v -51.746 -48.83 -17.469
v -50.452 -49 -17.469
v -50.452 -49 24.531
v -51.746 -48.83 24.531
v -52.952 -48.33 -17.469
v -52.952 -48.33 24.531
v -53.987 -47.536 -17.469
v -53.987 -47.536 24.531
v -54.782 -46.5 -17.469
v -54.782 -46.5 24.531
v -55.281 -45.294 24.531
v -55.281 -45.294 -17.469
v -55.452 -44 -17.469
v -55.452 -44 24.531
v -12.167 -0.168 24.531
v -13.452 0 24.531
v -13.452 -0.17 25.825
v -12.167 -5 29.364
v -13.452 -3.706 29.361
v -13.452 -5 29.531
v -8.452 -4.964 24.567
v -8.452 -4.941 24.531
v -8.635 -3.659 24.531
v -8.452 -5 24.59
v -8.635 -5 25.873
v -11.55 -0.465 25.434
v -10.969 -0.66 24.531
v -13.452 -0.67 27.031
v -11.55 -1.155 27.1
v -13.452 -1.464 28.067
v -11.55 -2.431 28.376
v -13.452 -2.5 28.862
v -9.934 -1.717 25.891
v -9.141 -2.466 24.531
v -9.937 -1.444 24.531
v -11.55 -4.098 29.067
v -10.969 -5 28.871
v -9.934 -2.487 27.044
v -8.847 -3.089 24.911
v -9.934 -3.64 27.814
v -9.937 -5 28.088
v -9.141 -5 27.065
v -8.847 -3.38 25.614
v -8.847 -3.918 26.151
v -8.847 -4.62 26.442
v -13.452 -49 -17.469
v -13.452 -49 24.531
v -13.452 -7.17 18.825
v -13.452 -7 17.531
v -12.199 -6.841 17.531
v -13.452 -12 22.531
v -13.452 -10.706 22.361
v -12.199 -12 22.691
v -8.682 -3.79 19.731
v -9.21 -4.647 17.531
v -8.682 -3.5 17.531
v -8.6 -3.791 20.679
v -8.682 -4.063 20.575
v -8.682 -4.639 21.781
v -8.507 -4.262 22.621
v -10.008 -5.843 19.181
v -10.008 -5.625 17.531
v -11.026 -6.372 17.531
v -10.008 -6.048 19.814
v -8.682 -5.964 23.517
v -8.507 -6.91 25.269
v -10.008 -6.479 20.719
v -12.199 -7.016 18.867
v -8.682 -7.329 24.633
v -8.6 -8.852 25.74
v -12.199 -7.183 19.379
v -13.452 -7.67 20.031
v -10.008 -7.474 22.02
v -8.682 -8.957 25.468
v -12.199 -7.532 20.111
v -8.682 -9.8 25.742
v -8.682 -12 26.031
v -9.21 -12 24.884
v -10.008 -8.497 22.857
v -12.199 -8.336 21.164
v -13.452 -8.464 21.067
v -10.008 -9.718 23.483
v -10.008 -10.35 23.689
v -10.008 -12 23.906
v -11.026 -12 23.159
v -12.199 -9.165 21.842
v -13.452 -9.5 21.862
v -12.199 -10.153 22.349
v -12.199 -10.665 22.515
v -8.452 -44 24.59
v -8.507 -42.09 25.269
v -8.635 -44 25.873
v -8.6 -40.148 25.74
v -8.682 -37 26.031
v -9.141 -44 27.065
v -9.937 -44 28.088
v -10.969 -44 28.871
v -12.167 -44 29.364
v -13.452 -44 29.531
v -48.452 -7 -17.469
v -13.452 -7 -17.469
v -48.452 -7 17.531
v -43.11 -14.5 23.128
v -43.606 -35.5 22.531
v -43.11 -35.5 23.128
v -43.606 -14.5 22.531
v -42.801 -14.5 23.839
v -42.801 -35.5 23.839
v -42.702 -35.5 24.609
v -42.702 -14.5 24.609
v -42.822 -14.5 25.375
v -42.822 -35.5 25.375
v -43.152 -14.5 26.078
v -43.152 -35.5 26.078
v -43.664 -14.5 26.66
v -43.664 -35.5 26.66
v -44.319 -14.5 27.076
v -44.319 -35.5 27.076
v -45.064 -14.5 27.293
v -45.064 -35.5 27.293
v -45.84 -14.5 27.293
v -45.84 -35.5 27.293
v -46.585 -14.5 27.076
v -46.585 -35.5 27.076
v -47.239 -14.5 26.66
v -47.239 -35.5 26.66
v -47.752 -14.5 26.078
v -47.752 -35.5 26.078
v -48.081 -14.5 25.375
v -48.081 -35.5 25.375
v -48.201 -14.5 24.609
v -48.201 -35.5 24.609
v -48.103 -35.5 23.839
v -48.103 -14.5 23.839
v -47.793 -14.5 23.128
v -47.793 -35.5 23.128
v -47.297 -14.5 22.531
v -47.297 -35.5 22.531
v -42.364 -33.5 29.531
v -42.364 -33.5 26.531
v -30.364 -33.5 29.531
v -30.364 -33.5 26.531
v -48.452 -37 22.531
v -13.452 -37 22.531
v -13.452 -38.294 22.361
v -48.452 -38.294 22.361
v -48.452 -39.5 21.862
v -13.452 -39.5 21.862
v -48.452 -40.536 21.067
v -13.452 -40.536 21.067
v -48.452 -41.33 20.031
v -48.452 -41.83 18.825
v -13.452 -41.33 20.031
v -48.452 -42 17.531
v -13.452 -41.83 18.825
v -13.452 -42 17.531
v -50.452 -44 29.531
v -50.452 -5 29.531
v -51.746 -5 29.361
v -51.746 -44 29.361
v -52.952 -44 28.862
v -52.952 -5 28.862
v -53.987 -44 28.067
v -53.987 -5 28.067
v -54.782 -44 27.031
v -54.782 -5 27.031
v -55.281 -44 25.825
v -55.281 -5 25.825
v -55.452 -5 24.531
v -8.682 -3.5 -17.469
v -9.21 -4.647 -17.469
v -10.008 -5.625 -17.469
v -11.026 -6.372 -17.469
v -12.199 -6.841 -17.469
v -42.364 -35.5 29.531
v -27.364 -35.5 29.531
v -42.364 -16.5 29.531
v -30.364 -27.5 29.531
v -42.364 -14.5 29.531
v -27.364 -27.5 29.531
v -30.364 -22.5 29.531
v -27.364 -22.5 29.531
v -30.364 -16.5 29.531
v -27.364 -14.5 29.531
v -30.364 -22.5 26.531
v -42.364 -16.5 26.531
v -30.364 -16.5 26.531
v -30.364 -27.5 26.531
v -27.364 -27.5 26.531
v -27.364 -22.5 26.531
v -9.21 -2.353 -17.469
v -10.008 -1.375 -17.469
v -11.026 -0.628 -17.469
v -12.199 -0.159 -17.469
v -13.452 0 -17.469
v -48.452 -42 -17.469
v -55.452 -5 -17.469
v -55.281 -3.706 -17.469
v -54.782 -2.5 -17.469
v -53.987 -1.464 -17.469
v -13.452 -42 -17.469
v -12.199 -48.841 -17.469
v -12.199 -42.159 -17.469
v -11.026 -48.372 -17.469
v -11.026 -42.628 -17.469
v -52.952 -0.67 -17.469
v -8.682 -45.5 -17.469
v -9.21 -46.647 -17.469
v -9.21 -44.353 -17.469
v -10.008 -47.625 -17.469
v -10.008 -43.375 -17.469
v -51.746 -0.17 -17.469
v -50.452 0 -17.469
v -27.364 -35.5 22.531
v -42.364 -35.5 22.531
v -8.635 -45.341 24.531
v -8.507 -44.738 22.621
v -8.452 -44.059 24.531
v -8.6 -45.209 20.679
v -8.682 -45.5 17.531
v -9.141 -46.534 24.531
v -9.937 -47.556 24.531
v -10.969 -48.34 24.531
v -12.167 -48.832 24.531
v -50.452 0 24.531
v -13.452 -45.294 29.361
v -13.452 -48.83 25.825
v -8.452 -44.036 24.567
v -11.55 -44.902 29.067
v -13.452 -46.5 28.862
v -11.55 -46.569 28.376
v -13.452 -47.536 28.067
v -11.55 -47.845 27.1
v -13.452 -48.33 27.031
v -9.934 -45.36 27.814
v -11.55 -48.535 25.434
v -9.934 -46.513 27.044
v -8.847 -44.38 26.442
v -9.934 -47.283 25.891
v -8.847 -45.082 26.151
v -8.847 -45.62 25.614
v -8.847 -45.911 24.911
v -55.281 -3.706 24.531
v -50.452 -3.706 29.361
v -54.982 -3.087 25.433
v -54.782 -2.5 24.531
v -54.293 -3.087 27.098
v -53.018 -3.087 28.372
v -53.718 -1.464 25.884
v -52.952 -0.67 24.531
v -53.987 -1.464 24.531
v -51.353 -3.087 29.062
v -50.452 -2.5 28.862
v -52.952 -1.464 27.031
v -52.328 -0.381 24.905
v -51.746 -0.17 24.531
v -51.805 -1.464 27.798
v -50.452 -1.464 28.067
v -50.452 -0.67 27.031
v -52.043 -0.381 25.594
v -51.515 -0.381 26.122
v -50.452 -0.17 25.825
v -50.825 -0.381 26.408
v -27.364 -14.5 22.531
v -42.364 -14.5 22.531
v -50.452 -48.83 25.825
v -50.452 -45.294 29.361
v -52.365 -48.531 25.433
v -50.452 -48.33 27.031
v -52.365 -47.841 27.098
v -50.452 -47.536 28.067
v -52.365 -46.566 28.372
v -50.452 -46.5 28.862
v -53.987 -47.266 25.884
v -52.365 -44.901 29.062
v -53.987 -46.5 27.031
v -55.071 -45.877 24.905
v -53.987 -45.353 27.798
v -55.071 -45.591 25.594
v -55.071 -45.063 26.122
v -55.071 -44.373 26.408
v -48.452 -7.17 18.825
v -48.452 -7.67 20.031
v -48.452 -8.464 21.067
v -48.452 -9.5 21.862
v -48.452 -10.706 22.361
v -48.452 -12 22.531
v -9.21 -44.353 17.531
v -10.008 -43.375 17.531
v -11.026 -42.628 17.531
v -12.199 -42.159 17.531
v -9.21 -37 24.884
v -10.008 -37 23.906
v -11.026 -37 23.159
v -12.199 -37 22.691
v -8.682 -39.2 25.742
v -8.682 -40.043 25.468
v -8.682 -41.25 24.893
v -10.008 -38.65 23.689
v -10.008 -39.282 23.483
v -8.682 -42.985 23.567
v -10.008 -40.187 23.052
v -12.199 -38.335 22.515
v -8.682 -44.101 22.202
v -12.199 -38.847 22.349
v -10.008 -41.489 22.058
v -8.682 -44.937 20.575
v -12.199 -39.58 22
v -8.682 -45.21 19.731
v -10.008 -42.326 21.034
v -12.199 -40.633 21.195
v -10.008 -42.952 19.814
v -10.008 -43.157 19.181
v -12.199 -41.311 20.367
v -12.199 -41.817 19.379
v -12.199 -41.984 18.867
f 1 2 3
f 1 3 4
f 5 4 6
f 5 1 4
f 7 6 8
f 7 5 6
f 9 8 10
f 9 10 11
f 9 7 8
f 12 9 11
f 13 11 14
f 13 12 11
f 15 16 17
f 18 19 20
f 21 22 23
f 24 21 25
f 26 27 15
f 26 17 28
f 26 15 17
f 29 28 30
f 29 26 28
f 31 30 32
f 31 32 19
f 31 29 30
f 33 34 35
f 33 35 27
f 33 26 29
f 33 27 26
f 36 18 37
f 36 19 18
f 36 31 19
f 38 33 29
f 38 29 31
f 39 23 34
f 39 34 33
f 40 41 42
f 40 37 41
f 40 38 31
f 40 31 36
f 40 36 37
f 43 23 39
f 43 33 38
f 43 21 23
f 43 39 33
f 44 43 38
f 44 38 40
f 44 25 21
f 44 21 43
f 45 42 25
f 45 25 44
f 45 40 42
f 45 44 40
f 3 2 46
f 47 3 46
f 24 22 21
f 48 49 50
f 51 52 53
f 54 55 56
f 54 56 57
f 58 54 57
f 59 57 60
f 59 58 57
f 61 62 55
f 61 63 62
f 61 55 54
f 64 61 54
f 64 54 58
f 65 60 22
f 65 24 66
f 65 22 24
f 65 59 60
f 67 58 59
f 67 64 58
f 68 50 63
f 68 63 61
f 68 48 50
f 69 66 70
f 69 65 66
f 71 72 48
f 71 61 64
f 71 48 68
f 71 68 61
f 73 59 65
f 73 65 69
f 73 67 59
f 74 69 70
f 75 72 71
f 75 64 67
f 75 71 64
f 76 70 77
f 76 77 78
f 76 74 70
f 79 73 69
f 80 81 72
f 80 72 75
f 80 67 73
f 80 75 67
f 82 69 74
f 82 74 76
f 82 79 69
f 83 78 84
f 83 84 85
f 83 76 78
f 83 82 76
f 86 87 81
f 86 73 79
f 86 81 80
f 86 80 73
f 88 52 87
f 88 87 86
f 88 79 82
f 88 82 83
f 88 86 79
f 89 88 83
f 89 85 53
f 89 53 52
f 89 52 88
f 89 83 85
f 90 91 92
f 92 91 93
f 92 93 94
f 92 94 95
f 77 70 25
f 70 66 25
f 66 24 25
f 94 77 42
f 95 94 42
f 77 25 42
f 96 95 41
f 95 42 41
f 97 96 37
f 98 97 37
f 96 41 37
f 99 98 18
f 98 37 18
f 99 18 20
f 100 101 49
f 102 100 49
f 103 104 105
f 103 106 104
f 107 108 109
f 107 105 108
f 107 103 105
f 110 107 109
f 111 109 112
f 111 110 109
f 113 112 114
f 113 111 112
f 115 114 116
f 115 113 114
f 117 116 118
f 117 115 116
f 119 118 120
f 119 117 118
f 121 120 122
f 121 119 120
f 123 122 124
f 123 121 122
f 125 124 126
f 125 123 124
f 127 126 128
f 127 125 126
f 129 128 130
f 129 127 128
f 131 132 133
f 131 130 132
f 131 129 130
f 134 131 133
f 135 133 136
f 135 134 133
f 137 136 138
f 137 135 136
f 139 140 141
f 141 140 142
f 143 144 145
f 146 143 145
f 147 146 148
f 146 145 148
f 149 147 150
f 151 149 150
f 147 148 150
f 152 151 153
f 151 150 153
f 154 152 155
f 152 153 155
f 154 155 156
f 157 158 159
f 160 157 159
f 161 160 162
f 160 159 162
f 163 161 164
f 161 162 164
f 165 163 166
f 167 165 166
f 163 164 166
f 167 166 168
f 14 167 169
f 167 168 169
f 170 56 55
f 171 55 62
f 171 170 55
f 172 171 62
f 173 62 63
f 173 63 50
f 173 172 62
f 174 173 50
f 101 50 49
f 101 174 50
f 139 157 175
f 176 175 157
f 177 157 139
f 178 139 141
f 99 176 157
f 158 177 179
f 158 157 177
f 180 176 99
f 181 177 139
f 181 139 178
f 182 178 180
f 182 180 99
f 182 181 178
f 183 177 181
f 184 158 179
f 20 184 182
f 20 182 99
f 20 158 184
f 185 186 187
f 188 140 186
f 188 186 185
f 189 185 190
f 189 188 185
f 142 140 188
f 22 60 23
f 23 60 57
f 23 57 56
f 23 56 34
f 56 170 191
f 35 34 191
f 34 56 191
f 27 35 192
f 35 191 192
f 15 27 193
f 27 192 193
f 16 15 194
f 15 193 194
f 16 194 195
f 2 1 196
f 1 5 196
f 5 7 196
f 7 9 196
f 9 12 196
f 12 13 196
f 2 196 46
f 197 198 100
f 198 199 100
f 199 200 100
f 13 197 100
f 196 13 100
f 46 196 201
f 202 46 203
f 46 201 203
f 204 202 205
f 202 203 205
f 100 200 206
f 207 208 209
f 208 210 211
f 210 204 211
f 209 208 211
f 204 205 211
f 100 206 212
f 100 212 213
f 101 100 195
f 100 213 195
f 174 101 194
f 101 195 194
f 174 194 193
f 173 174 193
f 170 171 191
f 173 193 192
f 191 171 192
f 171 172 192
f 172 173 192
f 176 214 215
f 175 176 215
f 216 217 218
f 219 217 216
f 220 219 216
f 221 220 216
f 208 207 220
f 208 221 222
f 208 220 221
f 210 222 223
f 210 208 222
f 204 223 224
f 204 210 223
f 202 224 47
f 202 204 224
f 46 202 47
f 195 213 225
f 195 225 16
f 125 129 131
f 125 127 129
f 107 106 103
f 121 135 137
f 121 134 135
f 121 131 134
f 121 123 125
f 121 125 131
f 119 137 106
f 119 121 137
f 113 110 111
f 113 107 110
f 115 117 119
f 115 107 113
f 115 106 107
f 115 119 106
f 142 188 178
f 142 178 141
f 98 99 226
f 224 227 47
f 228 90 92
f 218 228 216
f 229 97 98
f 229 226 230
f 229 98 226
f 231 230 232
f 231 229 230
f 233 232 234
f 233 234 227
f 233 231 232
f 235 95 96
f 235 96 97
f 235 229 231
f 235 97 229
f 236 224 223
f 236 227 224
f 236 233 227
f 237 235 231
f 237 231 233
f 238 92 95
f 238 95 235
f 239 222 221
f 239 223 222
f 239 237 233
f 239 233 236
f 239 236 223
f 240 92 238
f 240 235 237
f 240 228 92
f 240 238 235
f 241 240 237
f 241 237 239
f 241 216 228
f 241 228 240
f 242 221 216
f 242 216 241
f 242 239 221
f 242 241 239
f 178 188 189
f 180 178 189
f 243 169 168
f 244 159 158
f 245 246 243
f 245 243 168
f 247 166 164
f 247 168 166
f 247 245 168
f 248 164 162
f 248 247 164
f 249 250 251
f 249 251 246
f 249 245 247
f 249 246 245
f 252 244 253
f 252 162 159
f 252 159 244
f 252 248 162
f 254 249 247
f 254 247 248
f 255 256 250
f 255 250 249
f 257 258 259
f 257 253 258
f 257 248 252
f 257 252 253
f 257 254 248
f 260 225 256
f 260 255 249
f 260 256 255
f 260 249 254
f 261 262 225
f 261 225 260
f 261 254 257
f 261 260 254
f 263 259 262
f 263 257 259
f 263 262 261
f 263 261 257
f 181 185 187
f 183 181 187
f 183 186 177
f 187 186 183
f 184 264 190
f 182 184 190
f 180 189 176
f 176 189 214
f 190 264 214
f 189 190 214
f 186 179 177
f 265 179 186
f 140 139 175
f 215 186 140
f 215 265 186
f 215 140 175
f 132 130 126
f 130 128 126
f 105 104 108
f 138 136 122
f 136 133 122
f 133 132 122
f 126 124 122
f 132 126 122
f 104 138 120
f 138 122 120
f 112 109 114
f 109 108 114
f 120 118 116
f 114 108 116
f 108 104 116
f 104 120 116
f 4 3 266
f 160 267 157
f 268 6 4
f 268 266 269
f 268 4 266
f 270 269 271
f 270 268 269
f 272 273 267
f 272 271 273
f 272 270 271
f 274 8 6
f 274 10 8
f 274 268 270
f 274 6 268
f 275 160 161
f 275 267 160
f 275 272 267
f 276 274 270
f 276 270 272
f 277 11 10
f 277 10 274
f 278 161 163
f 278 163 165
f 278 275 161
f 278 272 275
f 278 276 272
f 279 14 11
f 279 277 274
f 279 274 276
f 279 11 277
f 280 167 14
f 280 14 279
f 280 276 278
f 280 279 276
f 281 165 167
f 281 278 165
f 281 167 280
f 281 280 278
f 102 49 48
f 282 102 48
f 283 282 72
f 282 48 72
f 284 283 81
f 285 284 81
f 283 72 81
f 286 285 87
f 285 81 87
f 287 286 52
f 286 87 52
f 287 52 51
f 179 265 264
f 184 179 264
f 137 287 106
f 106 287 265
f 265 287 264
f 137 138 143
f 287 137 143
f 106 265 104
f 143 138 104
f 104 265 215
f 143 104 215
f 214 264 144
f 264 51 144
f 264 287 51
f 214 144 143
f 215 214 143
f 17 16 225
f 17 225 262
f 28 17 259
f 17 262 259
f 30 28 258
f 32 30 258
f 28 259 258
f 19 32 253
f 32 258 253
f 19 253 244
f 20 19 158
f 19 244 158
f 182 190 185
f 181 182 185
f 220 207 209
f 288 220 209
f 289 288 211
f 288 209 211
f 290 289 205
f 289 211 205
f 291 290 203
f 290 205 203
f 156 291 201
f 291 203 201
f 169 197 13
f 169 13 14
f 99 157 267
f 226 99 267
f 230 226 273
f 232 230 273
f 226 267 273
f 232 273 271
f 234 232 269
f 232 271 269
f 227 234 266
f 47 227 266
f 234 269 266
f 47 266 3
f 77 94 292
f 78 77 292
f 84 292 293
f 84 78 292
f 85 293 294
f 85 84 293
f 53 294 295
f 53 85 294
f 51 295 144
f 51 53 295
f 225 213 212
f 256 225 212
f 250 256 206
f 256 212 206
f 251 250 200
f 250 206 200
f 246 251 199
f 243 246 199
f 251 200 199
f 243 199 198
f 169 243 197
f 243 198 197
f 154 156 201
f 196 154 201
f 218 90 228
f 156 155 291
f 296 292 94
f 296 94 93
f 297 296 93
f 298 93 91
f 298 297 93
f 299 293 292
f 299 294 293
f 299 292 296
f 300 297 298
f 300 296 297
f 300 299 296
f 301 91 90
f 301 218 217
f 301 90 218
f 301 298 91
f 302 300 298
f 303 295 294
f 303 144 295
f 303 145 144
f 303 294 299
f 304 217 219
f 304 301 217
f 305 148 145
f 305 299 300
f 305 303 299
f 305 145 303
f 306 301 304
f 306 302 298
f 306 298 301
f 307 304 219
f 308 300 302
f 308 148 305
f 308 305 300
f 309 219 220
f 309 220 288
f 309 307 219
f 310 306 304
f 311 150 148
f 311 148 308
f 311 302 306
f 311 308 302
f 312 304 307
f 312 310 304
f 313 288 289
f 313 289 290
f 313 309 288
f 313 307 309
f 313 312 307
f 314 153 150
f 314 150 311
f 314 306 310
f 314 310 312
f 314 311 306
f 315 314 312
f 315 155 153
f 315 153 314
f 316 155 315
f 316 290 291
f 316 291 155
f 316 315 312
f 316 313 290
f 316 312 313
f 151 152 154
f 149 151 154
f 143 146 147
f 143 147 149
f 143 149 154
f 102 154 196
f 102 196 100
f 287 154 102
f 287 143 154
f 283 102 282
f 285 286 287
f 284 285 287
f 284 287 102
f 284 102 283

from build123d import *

# Parameters (mm, degrees)
F0_W         = 47
F0_H         = 47
F1_DEPTH     = 49
F3_DEPTH     = 40
F4_T1_DEPTH  = 37
F4_T3_DEPTH  = 54.5
F4_T5_DEPTH  = 39
F4_T7_DEPTH  = 25
F4_T9_DEPTH  = 47.5
F4_S13_W     = 5
F4_S13_H     = 5
F4_T14_DEPTH = 5
F4_S19_W     = 5
F4_S19_H     = 5
F4_T20_DEPTH = 5
F4_S25_W     = 5
F4_S25_H     = 5
F4_T26_DEPTH = 5
F4_S31_W     = 5
F4_S31_H     = 5
F4_T32_DEPTH = 5
F4_T36_ANGLE = 90
F4_T38_ANGLE = 90
F6_R         = 2.75
F7_DEPTH     = 21
F8_W         = 15
F8_H         = 21
F9_DEPTH     = 4
F10_W        = 3
F10_H        = 6
F10_W_2      = 12
F10_H_2      = 2
F11_DEPTH    = 3.0010001


# Not quite as in the source:
# - a fillet or chamfer that OpenCascade refuses, or shapes differently, is made with other operations: its cross-section is extruded or revolved along the edge and cut away or added


with BuildPart() as f1:
    # F0 (on Front) → F1 (new body)
    with BuildSketch(Plane.XZ):
        with Locations((-31.9517639409, 6.0313746929)):
            Rectangle(F0_W, F0_H)
    extrude(amount=F1_DEPTH)

    # F2 (on face) → F3 (cut)
    with BuildSketch(Plane.YZ.offset(-8.4517639409)):
        with BuildLine():
            Line((-12, 22.5313746929), (-37, 22.5313746929))
            ThreePointArc((-37, 22.5313746929), (-40.5355339059, 21.0669085988), (-42, 17.5313746929))
            Line((-42, 17.5313746929), (-42, -17.4686253071))
            Line((-42, -17.4686253071), (-7, -17.4686253071))
            Line((-7, -17.4686253071), (-7, 17.5313746929))
            ThreePointArc((-7, 17.5313746929), (-8.4644660941, 21.0669085988), (-12, 22.5313746929))
        make_face()
    extrude(amount=-F3_DEPTH, mode=Mode.SUBTRACT)

    # F4: fillet of radius 5 on 9 edges, made by hand

    # F4_s2 → F4_t1 (cut)
    with BuildSketch(Plane.YZ.offset(-50.4517639409)):
        with BuildLine():
            ThreePointArc((-44, 29.5313746929), (-47.5355339059, 28.0669085988), (-49, 24.5313746929))
            Line((-49, 24.5313746929), (-49, 29.5313746929))
            Line((-49, 29.5313746929), (-44, 29.5313746929))
        make_face()
        with BuildLine():
            ThreePointArc((0, 24.5313746929), (-1.4644660941, 28.0669085988), (-5, 29.5313746929))
            Line((-5, 29.5313746929), (0, 29.5313746929))
            Line((0, 29.5313746929), (0, 24.5313746929))
        make_face()
    extrude(amount=F4_T1_DEPTH, mode=Mode.SUBTRACT)

    # F4_s4 → F4_t3 (cut)
    with BuildSketch(Plane.XY.offset(-29.9686253071)):
        with BuildLine():
            ThreePointArc((-8.4517639409, -44), (-9.9162300349, -47.5355339059), (-13.4517639409, -49))
            Line((-13.4517639409, -49), (-8.4517639409, -49))
            Line((-8.4517639409, -49), (-8.4517639409, -44))
        make_face()
        with BuildLine():
            ThreePointArc((-8.4517639409, -5), (-9.9162300349, -1.4644660941), (-13.4517639409, 0))
            Line((-13.4517639409, 0), (-8.4517639409, 0))
            Line((-8.4517639409, 0), (-8.4517639409, -5))
        make_face()
        with BuildLine():
            ThreePointArc((-50.4517639409, 0), (-53.9872978468, -1.4644660941), (-55.4517639409, -5))
            Line((-55.4517639409, -5), (-55.4517639409, 0))
            Line((-55.4517639409, 0), (-50.4517639409, 0))
        make_face()
        with BuildLine():
            ThreePointArc((-50.4517639409, -49), (-53.9872978468, -47.5355339059), (-55.4517639409, -44))
            Line((-55.4517639409, -44), (-55.4517639409, -49))
            Line((-55.4517639409, -49), (-50.4517639409, -49))
        make_face()
    extrude(amount=F4_T3_DEPTH, mode=Mode.SUBTRACT)

    # F4_s6 → F4_t5 (cut)
    with BuildSketch(Plane.XZ.offset(5)):
        with BuildLine():
            ThreePointArc((-8.4517639409, 24.5313746929), (-9.9162300349, 28.0669085988), (-13.4517639409, 29.5313746929))
            Line((-13.4517639409, 29.5313746929), (-8.4517639409, 29.5313746929))
            Line((-8.4517639409, 29.5313746929), (-8.4517639409, 24.5313746929))
        make_face()
        with BuildLine():
            ThreePointArc((-50.4517639409, 29.5313746929), (-53.9872978468, 28.0669085988), (-55.4517639409, 24.5313746929))
            Line((-55.4517639409, 24.5313746929), (-55.4517639409, 29.5313746929))
            Line((-55.4517639409, 29.5313746929), (-50.4517639409, 29.5313746929))
        make_face()
    extrude(amount=F4_T5_DEPTH, mode=Mode.SUBTRACT)

    # F4_s8 → F4_t7 (cut)
    with BuildSketch(Plane.XZ.offset(12)):
        with BuildLine():
            ThreePointArc((-8.4517639409, 27.5313746929), (-9.9162300349, 23.995840787), (-13.4517639409, 22.5313746929))
            Line((-13.4517639409, 22.5313746929), (-8.4517639409, 22.5313746929))
            Line((-8.4517639409, 22.5313746929), (-8.4517639409, 27.5313746929))
        make_face()
    extrude(amount=F4_T7_DEPTH, mode=Mode.SUBTRACT)

    # F4_s10 → F4_t9 (cut)
    with BuildSketch(Plane.XY.offset(-29.9686253071)):
        with BuildLine():
            ThreePointArc((-8.4517639409, -47), (-9.9162300349, -43.4644660941), (-13.4517639409, -42))
            Line((-13.4517639409, -42), (-8.4517639409, -42))
            Line((-8.4517639409, -42), (-8.4517639409, -47))
        make_face()
        with BuildLine():
            ThreePointArc((-8.4517639409, -2), (-9.9162300349, -5.5355339059), (-13.4517639409, -7))
            Line((-13.4517639409, -7), (-8.4517639409, -7))
            Line((-8.4517639409, -7), (-8.4517639409, -2))
        make_face()
    extrude(amount=F4_T9_DEPTH, mode=Mode.SUBTRACT)


with BuildPart() as f4_tool12:
    # F4_s13 → F4_t14 (new body)
    with BuildSketch(Plane.YZ.offset(-13.4517639409)):
        with Locations((-46.5, 27.0313746929)):
            Rectangle(F4_S13_W, F4_S13_H)
    extrude(amount=F4_T14_DEPTH)

    # F4_s15 → F4_t16 (revolve, cut)
    with BuildSketch(Plane(origin=(-13.4517639409, -44, 24.5313746929), x_dir=(0, 0.7071067812, -0.7071067812), z_dir=(0, -0.7071067812, -0.7071067812))):
        with BuildLine():
            ThreePointArc((0, -5), (5, 0), (0, 5))
            Line((0, 5), (0, -5))
        make_face()
    revolve(axis=Axis((-13.4517639409, -44, 24.5313746929), (1, 0, 0)), mode=Mode.SUBTRACT)


with BuildPart() as f1_1:
    add(f1.part)

    # F4_t11: cut F4_tool12
    add(f4_tool12.part, mode=Mode.SUBTRACT)


with BuildPart() as f4_tool18:
    # F4_s19 → F4_t20 (new body)
    with BuildSketch(Plane.YZ.offset(-50.4517639409)):
        with Locations((-46.5, 27.0313746929)):
            Rectangle(F4_S19_W, F4_S19_H)
    extrude(amount=-F4_T20_DEPTH)

    # F4_s21 → F4_t22 (revolve, cut)
    with BuildSketch(Plane(origin=(-50.4517639409, -44, 24.5313746929), x_dir=(0, 0.7071067812, -0.7071067812), z_dir=(0, 0.7071067812, 0.7071067812))):
        with BuildLine():
            ThreePointArc((0, -5), (5, 0), (0, 5))
            Line((0, 5), (0, -5))
        make_face()
    revolve(axis=Axis((-50.4517639409, -44, 24.5313746929), (-1, 0, 0)), mode=Mode.SUBTRACT)


with BuildPart() as f1_2:
    add(f1_1.part)

    # F4_t17: cut F4_tool18
    add(f4_tool18.part, mode=Mode.SUBTRACT)


with BuildPart() as f4_tool24:
    # F4_s25 → F4_t26 (new body)
    with BuildSketch(Plane.YZ.offset(-13.4517639409)):
        with Locations((-2.5, 27.0313746929)):
            Rectangle(F4_S25_W, F4_S25_H)
    extrude(amount=F4_T26_DEPTH)

    # F4_s27 → F4_t28 (revolve, cut)
    with BuildSketch(Plane(origin=(-13.4517639409, -5, 24.5313746929), x_dir=(0, -0.7071067812, -0.7071067812), z_dir=(0, -0.7071067812, 0.7071067812))):
        with BuildLine():
            ThreePointArc((0, -5), (5, 0), (0, 5))
            Line((0, 5), (0, -5))
        make_face()
    revolve(axis=Axis((-13.4517639409, -5, 24.5313746929), (1, 0, 0)), mode=Mode.SUBTRACT)


with BuildPart() as f1_3:
    add(f1_2.part)

    # F4_t23: cut F4_tool24
    add(f4_tool24.part, mode=Mode.SUBTRACT)


with BuildPart() as f4_tool30:
    # F4_s31 → F4_t32 (new body)
    with BuildSketch(Plane.XZ.offset(5)):
        with Locations((-52.9517639409, 27.0313746929)):
            Rectangle(F4_S31_W, F4_S31_H)
    extrude(amount=-F4_T32_DEPTH)

    # F4_s33 → F4_t34 (revolve, cut)
    with BuildSketch(Plane(origin=(-50.4517639409, -5, 24.5313746929), x_dir=(0.7071067812, 0, -0.7071067812), z_dir=(0.7071067812, 0, 0.7071067812))):
        with BuildLine():
            ThreePointArc((0, -5), (5, 0), (0, 5))
            Line((0, 5), (0, -5))
        make_face()
    revolve(axis=Axis((-50.4517639409, -5, 24.5313746929), (0, 1, 0)), mode=Mode.SUBTRACT)


with BuildPart() as f1_4:
    add(f1_3.part)

    # F4_t29: cut F4_tool30
    add(f4_tool30.part, mode=Mode.SUBTRACT)

    # F4_s35 → F4_t36 (revolve, cut)
    with BuildSketch(Plane.XY.offset(17.5313746929)):
        with BuildLine():
            ThreePointArc((-8.4517639409, -2), (-9.9162300349, -5.5355339059), (-13.4517639409, -7))
            Line((-13.4517639409, -7), (-8.4517639409, -7))
            Line((-8.4517639409, -7), (-8.4517639409, -2))
        make_face()
    revolve(axis=Axis((-8.4517639409, -12, 17.5313746929), (1, 0, 0)), revolution_arc=F4_T36_ANGLE, mode=Mode.SUBTRACT)

    # F4_s37 → F4_t38 (revolve, cut)
    with BuildSketch(Plane.XZ.offset(37)):
        with BuildLine():
            ThreePointArc((-8.4517639409, 27.5313746929), (-9.9162300349, 23.995840787), (-13.4517639409, 22.5313746929))
            Line((-13.4517639409, 22.5313746929), (-8.4517639409, 22.5313746929))
            Line((-8.4517639409, 22.5313746929), (-8.4517639409, 27.5313746929))
        make_face()
    revolve(axis=Axis((-8.4517639409, -37, 17.5313746929), (1, 0, 0)), revolution_arc=F4_T38_ANGLE, mode=Mode.SUBTRACT)

    # F6 (on offset) → F7 (cut)
    with BuildSketch(Plane.XZ.offset(14.5)):
        with Locations((-45.4517639409, 24.5701503009)):
            Circle(F6_R)
    extrude(amount=F7_DEPTH, mode=Mode.SUBTRACT)

    # F8 (on face) → F9 (cut)
    with BuildSketch(Plane(origin=(0, 0, 22.5313746929), x_dir=(1, 0, 0), z_dir=(0, 0, -1))):
        with Locations((-34.8641358682, 25)):
            Rectangle(F8_W, F8_H)
    extrude(amount=-F9_DEPTH, mode=Mode.SUBTRACT)

    # F10 (on face) → F11 (cut, through all)
    with BuildSketch(Plane(origin=(0, 0, 26.5313746929), x_dir=(1, 0, 0), z_dir=(0, 0, -1))):
        with Locations((-28.8641358682, 30.5)):
            Rectangle(F10_W, F10_H)
        Polygon((-30.3641358682, 22.5), (-30.3641358682, 16.5), (-30.3641358682, 14.5), (-27.3641358682, 14.5), (-27.3641358682, 22.5), align=None)
        with Locations((-36.3641358682, 34.5)):
            Rectangle(F10_W_2, F10_H_2)
        with Locations((-28.8641358682, 34.5)):
            Rectangle(F10_W, F10_H_2)
        with Locations((-36.3641358682, 15.5)):
            Rectangle(F10_W_2, F10_H_2)
    extrude(amount=-F11_DEPTH, mode=Mode.SUBTRACT)


solid = f1_4.part
